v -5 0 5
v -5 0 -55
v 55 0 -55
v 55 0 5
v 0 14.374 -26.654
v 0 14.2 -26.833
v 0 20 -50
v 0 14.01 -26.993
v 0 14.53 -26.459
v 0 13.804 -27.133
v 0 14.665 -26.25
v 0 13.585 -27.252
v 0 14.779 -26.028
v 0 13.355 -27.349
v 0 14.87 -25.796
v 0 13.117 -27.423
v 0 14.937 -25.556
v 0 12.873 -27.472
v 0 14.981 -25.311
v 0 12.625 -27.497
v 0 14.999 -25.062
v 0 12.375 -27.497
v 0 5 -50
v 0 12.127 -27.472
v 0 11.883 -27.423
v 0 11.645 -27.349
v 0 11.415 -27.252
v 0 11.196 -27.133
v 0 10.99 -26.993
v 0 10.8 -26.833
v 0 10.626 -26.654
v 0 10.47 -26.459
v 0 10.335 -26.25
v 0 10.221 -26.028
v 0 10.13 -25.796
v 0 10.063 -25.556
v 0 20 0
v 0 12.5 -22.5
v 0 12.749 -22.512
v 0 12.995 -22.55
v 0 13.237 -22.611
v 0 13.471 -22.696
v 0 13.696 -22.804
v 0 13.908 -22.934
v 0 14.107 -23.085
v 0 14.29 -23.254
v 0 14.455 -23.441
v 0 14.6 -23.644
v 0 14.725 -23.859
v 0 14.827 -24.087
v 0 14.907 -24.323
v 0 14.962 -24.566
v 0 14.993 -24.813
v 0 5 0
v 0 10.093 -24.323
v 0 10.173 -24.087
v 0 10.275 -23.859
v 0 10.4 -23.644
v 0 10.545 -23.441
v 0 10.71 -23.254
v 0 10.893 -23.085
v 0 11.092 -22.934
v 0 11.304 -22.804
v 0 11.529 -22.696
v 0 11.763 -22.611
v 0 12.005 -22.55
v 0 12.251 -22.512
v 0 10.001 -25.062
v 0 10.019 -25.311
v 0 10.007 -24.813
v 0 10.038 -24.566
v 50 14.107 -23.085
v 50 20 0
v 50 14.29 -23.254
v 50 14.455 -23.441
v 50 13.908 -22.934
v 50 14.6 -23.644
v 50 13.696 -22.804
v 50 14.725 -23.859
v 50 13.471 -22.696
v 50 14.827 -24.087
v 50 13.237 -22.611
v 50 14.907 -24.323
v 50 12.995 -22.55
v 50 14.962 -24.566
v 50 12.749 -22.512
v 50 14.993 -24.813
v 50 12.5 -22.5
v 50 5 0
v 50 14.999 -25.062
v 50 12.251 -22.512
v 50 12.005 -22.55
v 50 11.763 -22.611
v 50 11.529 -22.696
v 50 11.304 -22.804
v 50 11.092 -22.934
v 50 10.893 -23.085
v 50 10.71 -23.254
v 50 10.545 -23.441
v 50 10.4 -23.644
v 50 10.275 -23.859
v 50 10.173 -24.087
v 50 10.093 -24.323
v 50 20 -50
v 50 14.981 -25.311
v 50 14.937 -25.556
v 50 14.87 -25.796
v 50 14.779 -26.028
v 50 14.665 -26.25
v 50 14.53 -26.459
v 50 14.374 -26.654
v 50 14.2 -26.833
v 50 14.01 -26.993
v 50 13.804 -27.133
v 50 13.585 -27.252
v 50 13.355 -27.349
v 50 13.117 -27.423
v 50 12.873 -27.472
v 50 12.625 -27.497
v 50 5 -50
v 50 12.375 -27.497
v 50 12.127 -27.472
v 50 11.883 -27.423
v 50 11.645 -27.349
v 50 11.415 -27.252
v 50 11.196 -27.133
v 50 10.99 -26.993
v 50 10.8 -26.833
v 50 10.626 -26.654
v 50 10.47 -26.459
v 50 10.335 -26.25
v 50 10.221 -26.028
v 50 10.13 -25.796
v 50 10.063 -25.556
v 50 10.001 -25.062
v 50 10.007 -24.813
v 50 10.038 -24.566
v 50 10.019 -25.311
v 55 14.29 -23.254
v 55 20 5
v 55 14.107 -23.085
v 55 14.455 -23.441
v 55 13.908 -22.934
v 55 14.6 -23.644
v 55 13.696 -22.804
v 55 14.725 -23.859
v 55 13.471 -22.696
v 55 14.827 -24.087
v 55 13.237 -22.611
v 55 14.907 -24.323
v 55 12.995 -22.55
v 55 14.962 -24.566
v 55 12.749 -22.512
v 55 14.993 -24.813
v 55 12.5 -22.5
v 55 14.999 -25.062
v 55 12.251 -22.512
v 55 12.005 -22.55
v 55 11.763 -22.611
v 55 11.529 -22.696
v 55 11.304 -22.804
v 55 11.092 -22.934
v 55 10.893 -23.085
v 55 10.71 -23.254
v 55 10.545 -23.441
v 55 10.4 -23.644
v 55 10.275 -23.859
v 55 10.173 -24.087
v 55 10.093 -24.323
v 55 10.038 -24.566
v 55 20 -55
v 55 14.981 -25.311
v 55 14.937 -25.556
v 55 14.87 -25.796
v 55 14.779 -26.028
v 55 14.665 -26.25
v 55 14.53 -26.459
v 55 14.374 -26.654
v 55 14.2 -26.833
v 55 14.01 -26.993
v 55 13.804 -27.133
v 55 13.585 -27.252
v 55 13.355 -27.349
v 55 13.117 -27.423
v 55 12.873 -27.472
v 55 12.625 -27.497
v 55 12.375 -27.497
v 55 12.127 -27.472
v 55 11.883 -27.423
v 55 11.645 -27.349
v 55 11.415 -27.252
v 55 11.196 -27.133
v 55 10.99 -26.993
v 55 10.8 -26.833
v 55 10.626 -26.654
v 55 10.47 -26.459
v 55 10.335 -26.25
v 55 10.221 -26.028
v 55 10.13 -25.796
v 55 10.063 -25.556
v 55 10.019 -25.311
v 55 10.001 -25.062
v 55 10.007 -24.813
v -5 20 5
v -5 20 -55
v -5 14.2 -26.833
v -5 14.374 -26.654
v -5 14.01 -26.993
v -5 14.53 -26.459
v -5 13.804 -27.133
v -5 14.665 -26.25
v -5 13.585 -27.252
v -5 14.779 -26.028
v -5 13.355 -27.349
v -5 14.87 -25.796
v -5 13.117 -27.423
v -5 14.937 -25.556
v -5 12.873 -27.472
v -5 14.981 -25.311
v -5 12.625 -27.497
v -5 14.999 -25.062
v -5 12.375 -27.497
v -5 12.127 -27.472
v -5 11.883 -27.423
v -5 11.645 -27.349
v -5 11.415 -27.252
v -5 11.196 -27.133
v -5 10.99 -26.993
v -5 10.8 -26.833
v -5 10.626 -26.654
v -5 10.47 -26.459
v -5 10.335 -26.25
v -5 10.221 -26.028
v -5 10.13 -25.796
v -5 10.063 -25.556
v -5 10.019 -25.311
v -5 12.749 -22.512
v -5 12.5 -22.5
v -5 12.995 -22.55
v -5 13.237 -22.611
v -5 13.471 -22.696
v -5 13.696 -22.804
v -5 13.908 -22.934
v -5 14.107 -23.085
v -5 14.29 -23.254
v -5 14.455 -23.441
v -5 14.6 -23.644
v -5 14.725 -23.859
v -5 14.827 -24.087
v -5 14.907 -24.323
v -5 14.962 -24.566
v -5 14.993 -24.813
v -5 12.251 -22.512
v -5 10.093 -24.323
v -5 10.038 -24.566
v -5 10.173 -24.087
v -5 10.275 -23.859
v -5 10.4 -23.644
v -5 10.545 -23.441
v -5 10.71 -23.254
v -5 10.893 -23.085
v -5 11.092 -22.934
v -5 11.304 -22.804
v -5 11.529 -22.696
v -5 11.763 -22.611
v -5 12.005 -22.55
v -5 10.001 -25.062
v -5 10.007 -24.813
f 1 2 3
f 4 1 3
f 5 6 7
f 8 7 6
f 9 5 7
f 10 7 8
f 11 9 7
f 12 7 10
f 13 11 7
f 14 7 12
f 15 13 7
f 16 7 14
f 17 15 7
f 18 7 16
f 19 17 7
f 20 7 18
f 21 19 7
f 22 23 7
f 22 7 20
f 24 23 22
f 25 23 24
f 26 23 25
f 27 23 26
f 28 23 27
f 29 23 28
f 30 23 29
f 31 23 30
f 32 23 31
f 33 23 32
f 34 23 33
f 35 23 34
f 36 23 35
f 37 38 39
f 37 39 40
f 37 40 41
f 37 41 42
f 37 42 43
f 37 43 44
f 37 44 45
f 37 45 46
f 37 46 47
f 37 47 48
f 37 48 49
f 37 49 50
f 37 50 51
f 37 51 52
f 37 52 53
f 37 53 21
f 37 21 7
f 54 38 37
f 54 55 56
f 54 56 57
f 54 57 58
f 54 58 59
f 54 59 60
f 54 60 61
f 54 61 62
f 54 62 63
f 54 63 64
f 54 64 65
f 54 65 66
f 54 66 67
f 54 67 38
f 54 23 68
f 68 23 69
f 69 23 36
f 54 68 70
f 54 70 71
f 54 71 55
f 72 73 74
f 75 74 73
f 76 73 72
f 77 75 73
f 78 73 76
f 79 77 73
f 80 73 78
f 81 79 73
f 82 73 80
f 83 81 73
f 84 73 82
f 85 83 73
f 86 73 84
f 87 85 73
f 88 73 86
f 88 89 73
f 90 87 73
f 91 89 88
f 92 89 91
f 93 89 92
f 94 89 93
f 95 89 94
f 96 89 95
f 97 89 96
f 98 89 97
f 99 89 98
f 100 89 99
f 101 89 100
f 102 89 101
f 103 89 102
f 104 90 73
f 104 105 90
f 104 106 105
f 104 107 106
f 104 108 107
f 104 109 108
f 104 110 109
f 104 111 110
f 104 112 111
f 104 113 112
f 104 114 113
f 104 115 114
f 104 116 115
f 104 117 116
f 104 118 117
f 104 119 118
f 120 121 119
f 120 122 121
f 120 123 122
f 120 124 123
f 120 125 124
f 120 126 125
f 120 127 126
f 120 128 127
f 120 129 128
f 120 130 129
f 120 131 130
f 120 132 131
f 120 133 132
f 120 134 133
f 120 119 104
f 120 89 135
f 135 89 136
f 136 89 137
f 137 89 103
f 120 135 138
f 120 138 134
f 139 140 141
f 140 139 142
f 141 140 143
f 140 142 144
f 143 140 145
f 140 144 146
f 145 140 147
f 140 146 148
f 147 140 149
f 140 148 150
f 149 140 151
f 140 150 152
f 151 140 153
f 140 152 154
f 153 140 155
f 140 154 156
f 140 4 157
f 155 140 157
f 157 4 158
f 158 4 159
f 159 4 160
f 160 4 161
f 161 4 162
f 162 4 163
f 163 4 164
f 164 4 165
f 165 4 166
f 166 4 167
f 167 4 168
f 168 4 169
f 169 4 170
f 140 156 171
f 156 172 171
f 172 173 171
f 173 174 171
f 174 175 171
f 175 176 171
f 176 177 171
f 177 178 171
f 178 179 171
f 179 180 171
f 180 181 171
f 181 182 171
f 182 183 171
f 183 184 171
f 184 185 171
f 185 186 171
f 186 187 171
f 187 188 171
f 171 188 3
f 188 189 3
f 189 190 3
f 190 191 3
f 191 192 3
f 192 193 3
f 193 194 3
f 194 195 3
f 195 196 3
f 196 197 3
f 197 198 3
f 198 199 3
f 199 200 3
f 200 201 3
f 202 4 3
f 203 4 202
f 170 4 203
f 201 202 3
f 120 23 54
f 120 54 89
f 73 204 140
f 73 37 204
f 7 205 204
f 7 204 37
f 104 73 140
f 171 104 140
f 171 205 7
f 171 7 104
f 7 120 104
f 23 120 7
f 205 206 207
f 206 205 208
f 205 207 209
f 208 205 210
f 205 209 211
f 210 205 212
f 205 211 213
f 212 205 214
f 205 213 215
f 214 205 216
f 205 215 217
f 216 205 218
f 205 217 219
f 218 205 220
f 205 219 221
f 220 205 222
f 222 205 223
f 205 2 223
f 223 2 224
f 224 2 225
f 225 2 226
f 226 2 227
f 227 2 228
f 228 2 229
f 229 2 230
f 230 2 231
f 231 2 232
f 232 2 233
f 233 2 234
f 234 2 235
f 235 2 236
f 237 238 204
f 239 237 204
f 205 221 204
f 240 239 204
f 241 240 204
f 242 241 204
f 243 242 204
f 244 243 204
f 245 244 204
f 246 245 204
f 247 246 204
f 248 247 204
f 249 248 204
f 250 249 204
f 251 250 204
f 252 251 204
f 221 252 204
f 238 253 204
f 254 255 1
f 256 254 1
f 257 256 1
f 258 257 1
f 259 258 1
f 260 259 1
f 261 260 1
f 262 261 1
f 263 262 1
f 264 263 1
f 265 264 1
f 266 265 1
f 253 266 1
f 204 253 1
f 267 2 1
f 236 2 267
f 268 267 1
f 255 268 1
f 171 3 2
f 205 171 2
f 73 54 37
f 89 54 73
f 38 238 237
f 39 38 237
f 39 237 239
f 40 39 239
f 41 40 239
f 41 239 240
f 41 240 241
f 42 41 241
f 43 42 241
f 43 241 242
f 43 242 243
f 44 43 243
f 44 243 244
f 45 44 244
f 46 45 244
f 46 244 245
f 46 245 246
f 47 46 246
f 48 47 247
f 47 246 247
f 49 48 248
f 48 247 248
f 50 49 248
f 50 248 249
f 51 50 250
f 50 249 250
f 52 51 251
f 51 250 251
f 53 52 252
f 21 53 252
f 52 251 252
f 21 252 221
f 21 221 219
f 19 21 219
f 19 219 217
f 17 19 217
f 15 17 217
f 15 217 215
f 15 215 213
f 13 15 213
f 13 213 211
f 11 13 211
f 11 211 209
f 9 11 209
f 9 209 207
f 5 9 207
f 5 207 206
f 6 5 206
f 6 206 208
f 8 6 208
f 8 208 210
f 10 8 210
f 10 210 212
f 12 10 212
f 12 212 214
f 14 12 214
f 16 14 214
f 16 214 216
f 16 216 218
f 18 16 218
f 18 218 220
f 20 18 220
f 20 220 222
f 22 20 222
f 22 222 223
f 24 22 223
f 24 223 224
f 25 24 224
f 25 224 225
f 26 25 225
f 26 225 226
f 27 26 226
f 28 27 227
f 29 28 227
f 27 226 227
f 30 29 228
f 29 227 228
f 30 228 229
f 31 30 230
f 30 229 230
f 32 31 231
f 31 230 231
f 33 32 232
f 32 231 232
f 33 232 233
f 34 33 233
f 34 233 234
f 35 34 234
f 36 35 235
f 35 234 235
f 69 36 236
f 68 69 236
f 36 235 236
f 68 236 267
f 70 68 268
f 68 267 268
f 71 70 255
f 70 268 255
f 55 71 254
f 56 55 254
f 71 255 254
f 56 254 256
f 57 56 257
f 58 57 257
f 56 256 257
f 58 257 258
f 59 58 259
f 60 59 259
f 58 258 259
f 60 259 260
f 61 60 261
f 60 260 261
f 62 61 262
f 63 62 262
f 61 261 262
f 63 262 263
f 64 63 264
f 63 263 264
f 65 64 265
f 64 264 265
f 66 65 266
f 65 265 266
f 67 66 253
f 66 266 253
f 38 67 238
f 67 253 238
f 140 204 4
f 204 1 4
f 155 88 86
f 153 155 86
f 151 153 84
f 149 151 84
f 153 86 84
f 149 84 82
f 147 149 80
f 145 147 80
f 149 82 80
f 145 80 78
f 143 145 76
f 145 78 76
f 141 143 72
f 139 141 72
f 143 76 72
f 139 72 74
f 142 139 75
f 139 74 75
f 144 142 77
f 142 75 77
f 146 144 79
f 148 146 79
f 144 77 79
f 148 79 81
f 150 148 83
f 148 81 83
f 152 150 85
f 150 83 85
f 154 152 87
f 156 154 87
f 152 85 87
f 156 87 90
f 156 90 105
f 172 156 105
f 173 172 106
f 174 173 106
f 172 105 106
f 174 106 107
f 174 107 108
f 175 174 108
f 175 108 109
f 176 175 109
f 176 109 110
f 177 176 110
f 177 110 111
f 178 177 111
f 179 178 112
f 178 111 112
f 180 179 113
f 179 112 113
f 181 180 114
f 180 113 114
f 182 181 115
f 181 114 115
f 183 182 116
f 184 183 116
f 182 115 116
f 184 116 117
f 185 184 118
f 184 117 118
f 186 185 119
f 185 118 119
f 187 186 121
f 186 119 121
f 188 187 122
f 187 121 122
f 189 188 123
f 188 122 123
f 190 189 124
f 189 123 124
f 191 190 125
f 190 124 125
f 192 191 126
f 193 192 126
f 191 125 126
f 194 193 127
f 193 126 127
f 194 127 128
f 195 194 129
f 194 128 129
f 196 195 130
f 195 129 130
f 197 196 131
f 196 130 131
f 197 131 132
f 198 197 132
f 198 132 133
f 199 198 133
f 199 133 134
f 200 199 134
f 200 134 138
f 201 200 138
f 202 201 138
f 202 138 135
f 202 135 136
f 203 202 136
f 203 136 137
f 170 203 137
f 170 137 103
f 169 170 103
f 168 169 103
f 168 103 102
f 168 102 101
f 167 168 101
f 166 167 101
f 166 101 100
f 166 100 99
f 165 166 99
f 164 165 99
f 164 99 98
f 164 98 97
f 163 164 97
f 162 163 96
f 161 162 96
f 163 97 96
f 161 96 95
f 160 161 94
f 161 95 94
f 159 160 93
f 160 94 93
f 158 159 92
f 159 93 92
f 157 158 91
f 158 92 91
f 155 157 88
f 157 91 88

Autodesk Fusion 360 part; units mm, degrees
sketch "Sketch1" plane through (0, 0, 0) normal (1, 0, 0) x (0, 0, -1)
sketch "Sketch2" plane through (0, 0, 0) normal (0, 1, 0) x (1, 0, 0)
  line L0 (0, 0) -> (50, 0)
  line L1 (50, 0) -> (50, 50)
  line L2 (50, 50) -> (0, 50)
  line L3 (0, 50) -> (0, 0)
  line L4 (-5, -5) -> (55, -5)
  line L5 (55, -5) -> (55, 55)
  line L6 (55, 55) -> (-5, 55)
  line L7 (-5, 55) -> (-5, -5)
  dimension "d1" = 50
  dimension "d2" = 50
  dimension "d3" = 5
extrude "Extrude1" add sketch "Sketch2" along normal blind 20
extrude "Extrude2" add sketch "Sketch2" along normal blind 5 contours L0 L1 L2 L3
sketch "Sketch3" plane through (-5, 0, 0) normal (-1, 0, 0) x (0, 0, 1)
  line L0 (-55, 0) -> (5, 0)
  line L1 (5, 0) -> (5, 20)
  line L2 (5, 20) -> (-55, 20)
  line L3 (-55, 20) -> (-55, 0)
  line L4 (-25, 20) -> (-25, 12.5) construction
  circle A0 centre (-25, 12.5) radius 2.5
  dimension "d8" = 7.5
  dimension "d9" = 5
extrude "Extrude3" cut sketch "Sketch3" against normal blind 163 contours A0
